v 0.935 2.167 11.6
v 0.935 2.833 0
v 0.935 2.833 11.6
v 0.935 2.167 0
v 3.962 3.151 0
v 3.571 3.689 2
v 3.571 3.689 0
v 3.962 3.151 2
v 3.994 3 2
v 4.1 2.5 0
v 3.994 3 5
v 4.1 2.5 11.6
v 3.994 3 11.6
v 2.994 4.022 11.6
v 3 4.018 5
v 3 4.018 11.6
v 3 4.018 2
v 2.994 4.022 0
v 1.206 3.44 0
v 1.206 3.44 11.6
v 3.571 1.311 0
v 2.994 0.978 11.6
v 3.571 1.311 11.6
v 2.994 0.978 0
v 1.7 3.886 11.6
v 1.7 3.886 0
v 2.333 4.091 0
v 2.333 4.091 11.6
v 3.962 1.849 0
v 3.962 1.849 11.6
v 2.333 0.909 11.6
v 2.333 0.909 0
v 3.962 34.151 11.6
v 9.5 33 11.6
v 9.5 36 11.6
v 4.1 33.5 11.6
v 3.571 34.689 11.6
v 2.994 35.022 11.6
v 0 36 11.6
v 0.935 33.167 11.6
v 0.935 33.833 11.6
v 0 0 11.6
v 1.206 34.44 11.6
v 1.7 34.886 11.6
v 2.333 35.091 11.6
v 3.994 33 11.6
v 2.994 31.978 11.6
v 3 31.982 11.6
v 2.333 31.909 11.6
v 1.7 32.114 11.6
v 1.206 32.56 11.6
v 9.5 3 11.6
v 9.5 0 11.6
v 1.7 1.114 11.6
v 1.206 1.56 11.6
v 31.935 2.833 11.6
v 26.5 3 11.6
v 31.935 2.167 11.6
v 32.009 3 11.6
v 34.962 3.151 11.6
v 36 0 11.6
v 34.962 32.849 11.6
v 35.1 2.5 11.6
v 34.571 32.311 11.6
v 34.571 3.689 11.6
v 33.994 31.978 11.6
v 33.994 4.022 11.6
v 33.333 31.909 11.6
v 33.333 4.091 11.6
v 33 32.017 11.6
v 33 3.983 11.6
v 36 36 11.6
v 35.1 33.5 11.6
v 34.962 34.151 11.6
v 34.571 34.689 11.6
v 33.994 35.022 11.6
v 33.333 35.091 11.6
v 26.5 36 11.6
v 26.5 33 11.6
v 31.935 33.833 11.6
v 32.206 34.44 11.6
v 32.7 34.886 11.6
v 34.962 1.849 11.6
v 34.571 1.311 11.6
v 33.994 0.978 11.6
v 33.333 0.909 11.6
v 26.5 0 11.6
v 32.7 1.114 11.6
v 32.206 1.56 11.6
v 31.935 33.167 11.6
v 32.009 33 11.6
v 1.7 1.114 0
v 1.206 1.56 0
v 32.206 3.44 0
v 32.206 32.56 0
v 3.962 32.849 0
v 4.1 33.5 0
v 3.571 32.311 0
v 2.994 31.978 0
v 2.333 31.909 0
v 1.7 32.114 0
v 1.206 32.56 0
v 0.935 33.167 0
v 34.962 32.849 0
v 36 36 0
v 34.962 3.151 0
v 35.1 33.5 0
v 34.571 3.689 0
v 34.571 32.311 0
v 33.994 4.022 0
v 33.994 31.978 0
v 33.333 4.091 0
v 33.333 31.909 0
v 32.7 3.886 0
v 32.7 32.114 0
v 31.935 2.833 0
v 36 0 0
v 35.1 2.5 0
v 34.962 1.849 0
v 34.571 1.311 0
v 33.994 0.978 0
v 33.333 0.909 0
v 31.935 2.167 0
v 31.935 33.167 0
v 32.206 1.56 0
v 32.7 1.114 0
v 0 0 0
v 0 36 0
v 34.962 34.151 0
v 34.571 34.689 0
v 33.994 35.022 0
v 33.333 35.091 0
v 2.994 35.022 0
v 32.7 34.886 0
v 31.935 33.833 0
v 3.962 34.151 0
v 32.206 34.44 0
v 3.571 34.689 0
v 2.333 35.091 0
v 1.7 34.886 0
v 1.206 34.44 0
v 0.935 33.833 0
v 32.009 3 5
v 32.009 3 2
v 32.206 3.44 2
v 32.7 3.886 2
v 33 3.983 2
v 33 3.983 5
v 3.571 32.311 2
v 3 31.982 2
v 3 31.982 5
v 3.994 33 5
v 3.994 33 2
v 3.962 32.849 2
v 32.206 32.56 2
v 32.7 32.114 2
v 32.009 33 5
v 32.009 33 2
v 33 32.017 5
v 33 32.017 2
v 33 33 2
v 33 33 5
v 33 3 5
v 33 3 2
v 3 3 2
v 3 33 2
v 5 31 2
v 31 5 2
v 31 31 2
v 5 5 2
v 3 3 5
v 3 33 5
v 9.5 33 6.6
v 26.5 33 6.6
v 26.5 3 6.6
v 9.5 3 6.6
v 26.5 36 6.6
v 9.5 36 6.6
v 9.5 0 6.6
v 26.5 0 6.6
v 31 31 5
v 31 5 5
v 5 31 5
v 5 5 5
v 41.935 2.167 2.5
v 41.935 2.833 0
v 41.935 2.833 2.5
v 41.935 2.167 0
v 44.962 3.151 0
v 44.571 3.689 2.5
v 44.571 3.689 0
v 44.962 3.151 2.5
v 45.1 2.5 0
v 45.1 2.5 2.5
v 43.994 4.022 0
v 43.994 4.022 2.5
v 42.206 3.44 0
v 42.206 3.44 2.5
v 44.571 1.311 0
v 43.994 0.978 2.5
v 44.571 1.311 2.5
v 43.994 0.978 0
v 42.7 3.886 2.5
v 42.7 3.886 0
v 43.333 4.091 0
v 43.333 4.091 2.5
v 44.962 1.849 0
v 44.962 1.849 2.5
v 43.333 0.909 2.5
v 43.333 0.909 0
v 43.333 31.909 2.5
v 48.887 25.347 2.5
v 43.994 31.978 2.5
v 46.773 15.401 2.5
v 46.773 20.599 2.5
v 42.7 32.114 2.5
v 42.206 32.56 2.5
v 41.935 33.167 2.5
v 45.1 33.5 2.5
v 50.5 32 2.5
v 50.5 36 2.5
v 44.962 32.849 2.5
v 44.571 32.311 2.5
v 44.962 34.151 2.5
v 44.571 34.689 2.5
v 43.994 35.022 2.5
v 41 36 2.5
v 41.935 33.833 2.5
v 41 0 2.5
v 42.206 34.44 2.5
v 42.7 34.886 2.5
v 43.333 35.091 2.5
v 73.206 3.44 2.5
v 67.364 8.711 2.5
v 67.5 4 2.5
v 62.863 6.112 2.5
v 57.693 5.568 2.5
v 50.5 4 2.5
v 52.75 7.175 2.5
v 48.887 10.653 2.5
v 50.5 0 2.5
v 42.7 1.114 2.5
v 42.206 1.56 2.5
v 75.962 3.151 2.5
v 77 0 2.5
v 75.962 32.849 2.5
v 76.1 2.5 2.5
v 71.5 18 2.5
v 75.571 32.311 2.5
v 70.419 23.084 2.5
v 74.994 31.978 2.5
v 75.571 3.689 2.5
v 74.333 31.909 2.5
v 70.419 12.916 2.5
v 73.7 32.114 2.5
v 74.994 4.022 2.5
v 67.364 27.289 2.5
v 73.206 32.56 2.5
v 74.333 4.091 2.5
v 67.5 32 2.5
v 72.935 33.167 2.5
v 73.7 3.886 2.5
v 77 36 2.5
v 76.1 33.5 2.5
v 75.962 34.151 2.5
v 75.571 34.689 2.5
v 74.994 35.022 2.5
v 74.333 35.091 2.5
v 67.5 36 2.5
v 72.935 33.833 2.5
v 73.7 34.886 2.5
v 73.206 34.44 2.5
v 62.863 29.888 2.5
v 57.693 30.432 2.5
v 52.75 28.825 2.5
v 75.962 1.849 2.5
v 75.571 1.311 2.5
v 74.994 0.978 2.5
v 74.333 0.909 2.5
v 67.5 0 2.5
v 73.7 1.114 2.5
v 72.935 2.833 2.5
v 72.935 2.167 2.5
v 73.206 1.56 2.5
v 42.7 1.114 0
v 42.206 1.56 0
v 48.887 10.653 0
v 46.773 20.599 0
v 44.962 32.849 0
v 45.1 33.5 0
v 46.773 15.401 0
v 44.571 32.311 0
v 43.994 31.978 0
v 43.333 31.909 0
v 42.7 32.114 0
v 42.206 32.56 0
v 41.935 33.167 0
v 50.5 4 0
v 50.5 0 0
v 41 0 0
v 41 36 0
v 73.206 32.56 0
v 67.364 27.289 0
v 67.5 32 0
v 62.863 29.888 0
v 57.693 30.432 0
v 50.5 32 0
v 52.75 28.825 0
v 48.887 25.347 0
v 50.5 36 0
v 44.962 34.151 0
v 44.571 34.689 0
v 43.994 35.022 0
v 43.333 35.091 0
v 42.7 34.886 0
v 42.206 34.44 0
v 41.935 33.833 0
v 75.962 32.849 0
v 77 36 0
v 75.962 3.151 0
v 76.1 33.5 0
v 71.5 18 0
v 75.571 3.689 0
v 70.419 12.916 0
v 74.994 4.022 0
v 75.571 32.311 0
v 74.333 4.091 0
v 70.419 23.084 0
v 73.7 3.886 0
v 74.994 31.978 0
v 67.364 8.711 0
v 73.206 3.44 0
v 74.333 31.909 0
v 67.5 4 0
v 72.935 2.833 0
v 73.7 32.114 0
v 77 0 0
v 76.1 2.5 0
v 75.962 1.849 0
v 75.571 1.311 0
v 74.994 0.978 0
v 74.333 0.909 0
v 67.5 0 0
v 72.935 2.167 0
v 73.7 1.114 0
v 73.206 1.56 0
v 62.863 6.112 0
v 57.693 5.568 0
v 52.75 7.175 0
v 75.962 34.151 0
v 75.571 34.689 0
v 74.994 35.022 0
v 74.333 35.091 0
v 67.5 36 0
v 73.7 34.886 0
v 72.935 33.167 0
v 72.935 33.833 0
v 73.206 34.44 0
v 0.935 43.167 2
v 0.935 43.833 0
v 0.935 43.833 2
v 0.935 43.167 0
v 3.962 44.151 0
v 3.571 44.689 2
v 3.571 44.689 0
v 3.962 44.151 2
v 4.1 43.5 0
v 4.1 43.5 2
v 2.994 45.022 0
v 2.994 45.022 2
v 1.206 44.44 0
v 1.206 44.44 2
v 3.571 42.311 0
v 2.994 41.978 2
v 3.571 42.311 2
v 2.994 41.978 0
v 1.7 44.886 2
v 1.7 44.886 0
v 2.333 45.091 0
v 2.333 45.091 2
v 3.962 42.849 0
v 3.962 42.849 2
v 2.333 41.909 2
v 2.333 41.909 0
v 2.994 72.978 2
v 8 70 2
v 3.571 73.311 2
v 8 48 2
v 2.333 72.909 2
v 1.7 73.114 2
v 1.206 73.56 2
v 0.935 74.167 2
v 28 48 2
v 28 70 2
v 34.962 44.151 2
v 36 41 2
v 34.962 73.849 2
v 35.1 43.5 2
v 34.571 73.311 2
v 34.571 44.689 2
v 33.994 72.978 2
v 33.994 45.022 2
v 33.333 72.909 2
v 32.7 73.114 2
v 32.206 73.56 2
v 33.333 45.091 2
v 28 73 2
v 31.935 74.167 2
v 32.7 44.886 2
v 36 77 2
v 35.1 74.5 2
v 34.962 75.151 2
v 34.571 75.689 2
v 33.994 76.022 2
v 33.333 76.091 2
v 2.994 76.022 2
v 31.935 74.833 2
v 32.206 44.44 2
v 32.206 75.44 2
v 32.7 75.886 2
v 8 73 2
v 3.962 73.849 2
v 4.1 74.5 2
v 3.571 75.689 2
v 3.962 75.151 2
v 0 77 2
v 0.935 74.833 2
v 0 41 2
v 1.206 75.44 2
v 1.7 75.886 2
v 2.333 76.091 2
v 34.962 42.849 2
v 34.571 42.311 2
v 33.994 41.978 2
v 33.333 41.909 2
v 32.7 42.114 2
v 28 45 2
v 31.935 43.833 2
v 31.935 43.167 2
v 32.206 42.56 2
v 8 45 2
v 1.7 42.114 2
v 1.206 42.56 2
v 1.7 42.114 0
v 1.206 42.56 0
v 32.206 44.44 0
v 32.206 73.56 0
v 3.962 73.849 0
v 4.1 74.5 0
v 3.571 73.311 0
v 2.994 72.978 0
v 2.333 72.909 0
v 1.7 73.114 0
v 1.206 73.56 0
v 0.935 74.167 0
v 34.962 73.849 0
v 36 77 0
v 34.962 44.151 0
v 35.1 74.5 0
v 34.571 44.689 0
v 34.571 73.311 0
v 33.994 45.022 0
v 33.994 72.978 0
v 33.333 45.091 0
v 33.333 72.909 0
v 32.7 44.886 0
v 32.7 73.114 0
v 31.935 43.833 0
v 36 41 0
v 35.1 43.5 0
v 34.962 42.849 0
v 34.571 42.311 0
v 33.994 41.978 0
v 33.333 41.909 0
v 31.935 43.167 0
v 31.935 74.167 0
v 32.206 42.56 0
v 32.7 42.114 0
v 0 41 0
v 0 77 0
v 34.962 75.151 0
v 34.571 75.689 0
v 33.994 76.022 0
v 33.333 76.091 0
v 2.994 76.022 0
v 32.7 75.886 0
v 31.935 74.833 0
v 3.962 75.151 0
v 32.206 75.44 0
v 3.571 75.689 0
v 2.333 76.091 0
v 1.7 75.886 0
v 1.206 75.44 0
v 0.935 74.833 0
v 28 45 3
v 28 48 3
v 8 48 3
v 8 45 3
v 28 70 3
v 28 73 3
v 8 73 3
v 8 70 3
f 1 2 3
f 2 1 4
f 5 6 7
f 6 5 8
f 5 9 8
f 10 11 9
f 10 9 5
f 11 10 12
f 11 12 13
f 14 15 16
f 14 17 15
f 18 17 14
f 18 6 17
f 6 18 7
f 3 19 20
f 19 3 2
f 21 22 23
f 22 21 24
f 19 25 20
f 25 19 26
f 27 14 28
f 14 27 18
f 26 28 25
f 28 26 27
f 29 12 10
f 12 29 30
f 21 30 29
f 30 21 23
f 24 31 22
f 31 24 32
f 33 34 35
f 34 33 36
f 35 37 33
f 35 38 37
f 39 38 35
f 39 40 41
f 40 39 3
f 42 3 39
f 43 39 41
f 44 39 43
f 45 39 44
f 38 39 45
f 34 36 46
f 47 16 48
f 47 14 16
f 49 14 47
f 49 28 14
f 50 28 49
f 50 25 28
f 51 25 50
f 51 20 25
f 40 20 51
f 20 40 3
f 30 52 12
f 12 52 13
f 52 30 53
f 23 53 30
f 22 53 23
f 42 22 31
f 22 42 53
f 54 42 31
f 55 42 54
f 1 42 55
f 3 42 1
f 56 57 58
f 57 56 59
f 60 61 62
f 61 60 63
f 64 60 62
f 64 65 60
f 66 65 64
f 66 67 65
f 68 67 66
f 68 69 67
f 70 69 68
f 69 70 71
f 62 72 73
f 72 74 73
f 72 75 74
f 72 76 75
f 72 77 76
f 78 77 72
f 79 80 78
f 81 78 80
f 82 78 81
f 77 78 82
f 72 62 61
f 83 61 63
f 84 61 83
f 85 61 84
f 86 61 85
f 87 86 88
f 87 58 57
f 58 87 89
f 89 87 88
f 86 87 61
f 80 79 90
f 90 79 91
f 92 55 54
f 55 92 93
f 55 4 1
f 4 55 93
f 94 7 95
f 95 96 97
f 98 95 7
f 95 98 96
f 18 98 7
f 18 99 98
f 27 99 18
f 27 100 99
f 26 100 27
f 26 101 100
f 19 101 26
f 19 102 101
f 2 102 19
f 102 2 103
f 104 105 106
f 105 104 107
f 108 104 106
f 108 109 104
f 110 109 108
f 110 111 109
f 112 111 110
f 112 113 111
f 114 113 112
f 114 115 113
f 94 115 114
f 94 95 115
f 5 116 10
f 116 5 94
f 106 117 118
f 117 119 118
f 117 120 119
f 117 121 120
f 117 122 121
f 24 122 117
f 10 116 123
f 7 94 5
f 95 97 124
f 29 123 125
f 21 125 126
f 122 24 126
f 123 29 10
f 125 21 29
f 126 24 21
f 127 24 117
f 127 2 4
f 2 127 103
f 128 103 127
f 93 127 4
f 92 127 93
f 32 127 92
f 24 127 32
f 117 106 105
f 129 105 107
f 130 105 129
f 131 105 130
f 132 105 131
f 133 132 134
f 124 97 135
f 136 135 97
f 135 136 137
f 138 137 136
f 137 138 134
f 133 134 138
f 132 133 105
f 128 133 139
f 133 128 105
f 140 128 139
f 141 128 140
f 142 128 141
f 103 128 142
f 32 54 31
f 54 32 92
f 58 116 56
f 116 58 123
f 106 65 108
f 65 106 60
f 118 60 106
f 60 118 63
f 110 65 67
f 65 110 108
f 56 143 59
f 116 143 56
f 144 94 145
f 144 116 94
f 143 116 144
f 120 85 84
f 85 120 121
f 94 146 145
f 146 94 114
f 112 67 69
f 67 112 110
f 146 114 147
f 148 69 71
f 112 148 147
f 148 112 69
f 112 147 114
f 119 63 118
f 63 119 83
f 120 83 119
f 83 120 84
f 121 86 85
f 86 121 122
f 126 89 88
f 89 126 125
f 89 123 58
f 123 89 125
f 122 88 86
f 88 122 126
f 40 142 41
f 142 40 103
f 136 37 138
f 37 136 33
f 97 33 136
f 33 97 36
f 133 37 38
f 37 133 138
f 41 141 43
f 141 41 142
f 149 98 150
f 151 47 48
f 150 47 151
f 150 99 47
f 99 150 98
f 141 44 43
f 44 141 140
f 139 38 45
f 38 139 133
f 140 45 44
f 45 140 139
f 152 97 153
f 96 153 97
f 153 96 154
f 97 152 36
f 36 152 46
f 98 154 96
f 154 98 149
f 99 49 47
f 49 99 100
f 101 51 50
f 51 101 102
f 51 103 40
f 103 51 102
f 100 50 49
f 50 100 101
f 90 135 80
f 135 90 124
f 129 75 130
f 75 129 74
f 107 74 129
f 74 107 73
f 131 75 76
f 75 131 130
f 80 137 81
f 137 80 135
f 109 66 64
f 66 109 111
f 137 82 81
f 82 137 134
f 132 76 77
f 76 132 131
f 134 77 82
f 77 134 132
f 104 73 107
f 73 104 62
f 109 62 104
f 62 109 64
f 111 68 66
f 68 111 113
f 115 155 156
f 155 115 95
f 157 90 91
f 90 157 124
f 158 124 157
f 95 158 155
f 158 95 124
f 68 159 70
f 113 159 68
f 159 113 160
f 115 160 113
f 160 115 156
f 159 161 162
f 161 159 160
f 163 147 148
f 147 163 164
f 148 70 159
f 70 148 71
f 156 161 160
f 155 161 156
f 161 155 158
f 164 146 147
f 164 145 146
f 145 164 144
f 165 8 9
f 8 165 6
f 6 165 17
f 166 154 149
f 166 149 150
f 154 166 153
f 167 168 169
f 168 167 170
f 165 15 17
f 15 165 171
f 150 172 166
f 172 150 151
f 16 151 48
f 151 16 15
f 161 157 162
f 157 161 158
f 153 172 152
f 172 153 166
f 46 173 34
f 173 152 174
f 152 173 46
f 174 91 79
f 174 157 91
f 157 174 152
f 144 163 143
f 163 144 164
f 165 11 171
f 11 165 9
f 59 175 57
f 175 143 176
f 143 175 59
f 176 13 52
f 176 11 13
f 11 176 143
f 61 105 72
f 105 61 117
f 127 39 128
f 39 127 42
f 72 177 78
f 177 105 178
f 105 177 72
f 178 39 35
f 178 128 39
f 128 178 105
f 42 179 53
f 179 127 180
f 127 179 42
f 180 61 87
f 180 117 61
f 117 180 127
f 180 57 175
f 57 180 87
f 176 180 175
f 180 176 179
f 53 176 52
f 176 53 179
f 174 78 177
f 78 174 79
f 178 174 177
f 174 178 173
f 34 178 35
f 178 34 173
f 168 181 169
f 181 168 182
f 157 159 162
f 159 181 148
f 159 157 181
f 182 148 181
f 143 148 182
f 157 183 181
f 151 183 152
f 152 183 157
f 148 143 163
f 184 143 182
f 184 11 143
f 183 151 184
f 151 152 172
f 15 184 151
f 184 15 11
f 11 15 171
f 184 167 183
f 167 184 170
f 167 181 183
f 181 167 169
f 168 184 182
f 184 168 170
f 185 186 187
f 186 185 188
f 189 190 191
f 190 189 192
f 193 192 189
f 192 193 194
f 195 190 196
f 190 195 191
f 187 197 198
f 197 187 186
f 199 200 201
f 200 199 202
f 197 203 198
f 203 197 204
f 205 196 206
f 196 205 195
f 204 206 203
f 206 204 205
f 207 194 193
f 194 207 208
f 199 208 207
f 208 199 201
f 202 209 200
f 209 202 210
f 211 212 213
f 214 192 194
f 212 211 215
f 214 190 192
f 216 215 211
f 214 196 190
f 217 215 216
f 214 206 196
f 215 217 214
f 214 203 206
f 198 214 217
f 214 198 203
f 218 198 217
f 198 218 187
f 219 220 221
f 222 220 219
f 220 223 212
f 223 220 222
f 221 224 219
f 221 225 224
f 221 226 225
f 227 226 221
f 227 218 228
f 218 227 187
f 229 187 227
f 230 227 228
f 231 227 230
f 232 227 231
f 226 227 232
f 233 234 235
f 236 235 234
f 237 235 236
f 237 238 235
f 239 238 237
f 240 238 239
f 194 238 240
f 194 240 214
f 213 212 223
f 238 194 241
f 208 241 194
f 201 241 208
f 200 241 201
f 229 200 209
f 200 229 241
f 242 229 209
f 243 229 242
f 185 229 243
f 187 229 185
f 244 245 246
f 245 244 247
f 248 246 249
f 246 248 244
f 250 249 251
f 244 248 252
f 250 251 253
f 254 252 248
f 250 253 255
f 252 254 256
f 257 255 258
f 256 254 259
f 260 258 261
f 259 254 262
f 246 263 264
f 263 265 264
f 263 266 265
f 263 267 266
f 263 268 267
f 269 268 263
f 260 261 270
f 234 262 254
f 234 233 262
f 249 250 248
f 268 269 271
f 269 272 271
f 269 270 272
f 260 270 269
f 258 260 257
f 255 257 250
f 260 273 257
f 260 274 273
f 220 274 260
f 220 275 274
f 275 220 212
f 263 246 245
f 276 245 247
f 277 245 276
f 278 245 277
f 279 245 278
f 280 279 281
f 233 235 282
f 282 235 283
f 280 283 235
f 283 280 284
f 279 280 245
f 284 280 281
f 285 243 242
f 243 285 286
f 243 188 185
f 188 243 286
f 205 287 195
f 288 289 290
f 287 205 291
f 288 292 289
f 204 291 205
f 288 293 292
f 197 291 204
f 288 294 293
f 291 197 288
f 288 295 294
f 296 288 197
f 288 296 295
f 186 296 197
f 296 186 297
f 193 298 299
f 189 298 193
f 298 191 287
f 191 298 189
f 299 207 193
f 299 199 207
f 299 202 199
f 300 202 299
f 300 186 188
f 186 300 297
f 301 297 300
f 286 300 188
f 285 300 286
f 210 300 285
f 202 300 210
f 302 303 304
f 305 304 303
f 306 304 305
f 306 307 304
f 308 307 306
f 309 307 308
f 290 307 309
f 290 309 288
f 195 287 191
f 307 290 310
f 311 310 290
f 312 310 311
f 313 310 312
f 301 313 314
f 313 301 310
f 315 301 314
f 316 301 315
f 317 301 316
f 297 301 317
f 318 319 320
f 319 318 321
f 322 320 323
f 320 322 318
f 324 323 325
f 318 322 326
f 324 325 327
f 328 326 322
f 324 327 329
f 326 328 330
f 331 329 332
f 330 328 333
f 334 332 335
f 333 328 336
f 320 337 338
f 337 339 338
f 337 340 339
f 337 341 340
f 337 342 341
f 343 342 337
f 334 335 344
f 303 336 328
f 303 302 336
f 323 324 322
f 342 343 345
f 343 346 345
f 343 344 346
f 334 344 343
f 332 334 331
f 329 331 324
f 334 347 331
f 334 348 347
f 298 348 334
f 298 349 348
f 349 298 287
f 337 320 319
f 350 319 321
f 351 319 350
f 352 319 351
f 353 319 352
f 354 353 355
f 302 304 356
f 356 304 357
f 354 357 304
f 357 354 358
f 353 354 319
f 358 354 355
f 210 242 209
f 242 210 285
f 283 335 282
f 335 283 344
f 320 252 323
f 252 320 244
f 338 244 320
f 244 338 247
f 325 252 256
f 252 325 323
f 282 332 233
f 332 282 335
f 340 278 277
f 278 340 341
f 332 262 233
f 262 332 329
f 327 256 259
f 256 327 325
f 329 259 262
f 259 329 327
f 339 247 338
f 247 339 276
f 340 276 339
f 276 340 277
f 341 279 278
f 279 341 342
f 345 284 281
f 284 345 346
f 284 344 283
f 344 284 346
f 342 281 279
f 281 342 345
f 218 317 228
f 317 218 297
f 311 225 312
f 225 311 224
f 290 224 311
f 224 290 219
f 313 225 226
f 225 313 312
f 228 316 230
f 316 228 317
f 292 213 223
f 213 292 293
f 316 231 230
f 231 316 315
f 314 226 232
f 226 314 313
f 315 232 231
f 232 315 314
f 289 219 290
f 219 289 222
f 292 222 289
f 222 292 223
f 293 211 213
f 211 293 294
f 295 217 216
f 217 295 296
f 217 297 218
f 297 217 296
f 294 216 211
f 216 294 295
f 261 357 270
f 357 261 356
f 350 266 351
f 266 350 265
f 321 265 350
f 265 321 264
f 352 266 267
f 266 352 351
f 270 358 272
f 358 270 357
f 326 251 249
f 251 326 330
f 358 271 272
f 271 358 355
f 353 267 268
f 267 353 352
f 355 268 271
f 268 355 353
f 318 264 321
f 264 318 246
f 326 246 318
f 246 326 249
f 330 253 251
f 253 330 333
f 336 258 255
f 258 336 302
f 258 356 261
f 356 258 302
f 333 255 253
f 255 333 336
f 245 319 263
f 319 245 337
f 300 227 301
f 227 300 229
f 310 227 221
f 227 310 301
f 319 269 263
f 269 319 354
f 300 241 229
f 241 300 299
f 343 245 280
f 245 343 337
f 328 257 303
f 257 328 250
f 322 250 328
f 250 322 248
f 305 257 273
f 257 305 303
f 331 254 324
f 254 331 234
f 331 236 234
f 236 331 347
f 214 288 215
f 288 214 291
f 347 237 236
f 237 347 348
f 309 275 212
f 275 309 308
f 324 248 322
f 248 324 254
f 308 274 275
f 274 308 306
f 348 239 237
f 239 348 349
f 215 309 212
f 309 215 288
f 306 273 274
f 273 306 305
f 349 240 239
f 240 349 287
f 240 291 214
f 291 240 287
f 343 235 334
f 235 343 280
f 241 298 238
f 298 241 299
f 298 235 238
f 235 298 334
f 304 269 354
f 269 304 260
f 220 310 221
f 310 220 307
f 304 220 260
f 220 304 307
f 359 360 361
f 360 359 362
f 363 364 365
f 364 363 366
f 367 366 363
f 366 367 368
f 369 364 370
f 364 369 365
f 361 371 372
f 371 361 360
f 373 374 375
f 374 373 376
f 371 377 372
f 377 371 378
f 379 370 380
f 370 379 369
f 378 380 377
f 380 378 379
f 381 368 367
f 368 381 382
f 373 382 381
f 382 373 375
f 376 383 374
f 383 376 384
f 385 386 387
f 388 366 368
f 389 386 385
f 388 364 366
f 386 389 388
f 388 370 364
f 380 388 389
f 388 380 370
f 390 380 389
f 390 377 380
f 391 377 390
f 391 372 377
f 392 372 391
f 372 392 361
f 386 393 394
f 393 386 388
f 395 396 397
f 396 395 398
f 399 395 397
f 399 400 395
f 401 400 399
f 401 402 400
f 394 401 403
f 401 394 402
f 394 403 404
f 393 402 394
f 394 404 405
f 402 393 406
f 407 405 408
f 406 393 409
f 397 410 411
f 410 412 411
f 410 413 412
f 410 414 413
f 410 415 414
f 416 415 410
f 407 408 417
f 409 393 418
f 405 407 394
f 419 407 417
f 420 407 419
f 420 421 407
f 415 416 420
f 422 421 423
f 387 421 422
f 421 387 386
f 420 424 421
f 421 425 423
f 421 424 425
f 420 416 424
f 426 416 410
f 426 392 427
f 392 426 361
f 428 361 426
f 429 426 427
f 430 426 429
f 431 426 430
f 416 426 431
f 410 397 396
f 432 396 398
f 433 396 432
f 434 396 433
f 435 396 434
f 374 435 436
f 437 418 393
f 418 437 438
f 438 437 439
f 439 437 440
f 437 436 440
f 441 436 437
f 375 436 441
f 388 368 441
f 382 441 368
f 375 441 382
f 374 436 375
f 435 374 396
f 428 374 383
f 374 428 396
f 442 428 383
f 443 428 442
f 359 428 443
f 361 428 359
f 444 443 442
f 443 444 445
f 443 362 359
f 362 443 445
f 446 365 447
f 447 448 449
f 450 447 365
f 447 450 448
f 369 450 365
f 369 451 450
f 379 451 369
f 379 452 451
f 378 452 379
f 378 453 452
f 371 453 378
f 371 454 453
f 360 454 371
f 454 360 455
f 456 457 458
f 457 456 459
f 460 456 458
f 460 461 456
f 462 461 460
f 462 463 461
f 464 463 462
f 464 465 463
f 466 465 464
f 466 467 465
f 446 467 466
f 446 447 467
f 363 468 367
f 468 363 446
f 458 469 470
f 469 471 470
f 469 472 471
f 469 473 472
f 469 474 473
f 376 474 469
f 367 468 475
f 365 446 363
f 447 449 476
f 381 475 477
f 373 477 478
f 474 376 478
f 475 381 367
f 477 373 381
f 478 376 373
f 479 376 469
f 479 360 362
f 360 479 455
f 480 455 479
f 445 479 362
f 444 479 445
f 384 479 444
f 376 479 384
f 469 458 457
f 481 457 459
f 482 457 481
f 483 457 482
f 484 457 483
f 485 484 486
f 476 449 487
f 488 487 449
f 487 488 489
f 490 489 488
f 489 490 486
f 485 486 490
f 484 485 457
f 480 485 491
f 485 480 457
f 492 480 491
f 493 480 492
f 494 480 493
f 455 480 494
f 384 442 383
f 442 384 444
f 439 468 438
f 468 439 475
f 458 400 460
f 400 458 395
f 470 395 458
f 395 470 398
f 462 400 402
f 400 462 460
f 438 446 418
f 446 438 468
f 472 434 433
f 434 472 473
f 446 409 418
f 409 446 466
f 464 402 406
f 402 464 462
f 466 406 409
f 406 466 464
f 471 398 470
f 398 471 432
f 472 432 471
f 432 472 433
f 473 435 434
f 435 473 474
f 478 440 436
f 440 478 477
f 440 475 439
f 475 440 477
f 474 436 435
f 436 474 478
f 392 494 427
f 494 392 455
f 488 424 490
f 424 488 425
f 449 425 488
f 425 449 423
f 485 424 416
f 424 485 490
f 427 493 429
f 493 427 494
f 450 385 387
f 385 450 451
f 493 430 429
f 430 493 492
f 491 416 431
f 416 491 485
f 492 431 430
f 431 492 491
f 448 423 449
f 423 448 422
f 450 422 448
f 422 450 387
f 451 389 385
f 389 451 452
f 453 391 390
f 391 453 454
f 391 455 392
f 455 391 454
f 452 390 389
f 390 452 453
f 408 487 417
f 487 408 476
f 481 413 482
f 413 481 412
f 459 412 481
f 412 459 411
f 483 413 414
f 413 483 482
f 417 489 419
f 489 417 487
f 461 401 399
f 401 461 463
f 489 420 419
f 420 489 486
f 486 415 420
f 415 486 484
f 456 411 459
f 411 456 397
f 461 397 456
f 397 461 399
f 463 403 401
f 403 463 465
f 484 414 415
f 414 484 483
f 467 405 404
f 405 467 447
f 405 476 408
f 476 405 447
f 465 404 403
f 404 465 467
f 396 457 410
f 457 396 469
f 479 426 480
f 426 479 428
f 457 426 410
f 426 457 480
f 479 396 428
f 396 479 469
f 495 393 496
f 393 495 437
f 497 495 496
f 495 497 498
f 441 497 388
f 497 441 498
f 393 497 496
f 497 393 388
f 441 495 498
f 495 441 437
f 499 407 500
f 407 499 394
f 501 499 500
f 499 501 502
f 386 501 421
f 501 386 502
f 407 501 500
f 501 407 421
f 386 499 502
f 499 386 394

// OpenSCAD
// the main width 
main_width = 36;

// for the connectors
breackout_width = 17;
breackout_depth = 4; 
breackout_height = 5;


// height of the top
top_height = 2.5;

// how thick is the outer wall
wall_thickness = 3;

// how thick is the bottom
bottom_thickness = 2; 

// pcb sizes
pcb_size = 30;
pcb_outline_width = 2;
pcb_clearance = 3;
pcb_height = 1.6;

// dome_radius
dome_diameter = 25;
dome_bottom_height = 5;

// screw holes
screw_diameter = 3.2;
screw_offset = 2.5;

// height of the bottom module
bottom_height = bottom_thickness + dome_bottom_height + pcb_clearance + pcb_height;

$fn = 15;

clamp_height = 2;
clamp_pin_height = 1;
clamp_pin_width = 20;
clamp_pin_thickness = 3;
clamp_pin_offset = 4;

// the bottom where the pcb is housing 
module bottom() {  
  difference() {
    // main cube from 
    cube([main_width, main_width, bottom_height]);    
    
    screw_holes(bottom_height);
    
    // breakouts
    brackout_offset = (main_width - breackout_width) / 2;
    translate([brackout_offset,0,bottom_height-breackout_height]) {
      cube([breackout_width,wall_thickness,breackout_height]);
    }    
    translate([brackout_offset,main_width-wall_thickness,bottom_height-breackout_height]) {
      cube([breackout_width,wall_thickness,breackout_height]);
    }
    
    // hollow the cube
    hollow_width = main_width - (wall_thickness * 2);
    corner_width = (hollow_width - pcb_size);
    translate([wall_thickness+(corner_width/2),wall_thickness,bottom_thickness]) {
      hollow_width = main_width - (wall_thickness * 2);
      hollow_height = bottom_height - bottom_thickness;       
      union() {
        cube([hollow_width-corner_width,hollow_width,hollow_height]);
        translate([-(corner_width/2),(corner_width/2),0]) {
          cube([hollow_width,hollow_width-corner_width,hollow_height]);
        }
      }  
    }
  }
  
  // place where to put the pcb
  translate([wall_thickness,wall_thickness,bottom_thickness]) {    
    pcb_holder();
  }    
    
  
  
};

// the pcb holder
module pcb_holder() {
  difference() {
    pcb_holder_height = pcb_clearance + pcb_height;
    pcb_holder_width = main_width - (2*wall_thickness);            
    cube([pcb_holder_width,pcb_holder_width,pcb_holder_height]);    

    // clearance
    center_clearance =  pcb_outline_width;
    translate([center_clearance ,center_clearance ,0]) {  
      clearance_width = pcb_size - (2*pcb_outline_width);
      cube([clearance_width,clearance_width,pcb_clearance]);
    }
    
    // pcb
    translate([0 ,0,pcb_clearance]) {
      cube([pcb_size,pcb_size,pcb_height]);
    }
  }
}

module top() {
  difference() {
    
    cube([main_width,main_width,top_height]);
    
    center_dome = main_width/2;
    translate([center_dome,center_dome,0]) {
      cylinder(top_height,d = dome_diameter);
    }
    
    center_breackout = (main_width-breackout_width) / 2;
    translate([center_breackout,0,0]) {
      cube([breackout_width, breackout_depth, top_height]);
    }
    
    translate([center_breackout,main_width-breackout_depth,0]) {
      cube([breackout_width, breackout_depth, top_height]);
    }
    
    screw_holes(top_height);
  }
  
}

// screw holes
module screw_holes(hole_height) {
  
  translate([screw_offset,screw_offset,0]) {
    cylinder(hole_height,d = screw_diameter);
  }
    
  translate([main_width-screw_offset,screw_offset,0]) {
    cylinder(hole_height,d = screw_diameter);
  }
    
  translate([screw_offset,main_width-screw_offset,0]) {
    cylinder(hole_height,d = screw_diameter);
  }
    
  translate([main_width-screw_offset,main_width-screw_offset,0]) {
    cylinder(hole_height,d = screw_diameter);
  }
}

// bottom clamp
module bottom_clamp() {
  difference() {
    cube([main_width,main_width,clamp_height]);    
    screw_holes(clamp_height);
  }
  pin_x_offset = (main_width - clamp_pin_width) / 2;
  translate([pin_x_offset ,clamp_pin_offset,clamp_height]) {
    cube([clamp_pin_width,clamp_pin_thickness,clamp_pin_height]);
  }
  
  translate([pin_x_offset ,main_width-(clamp_pin_offset + clamp_pin_thickness),clamp_height]) {
    cube([clamp_pin_width,clamp_pin_thickness,clamp_pin_height]);
  }
}

// draw the bottom
bottom();

// move so the top is next to the bottom
translate([main_width+5,0,0]) {
  top();
}

// move so the bottom_clamp is next to the bottom
translate([0,main_width+5,0]) {
  bottom_clamp();
}
